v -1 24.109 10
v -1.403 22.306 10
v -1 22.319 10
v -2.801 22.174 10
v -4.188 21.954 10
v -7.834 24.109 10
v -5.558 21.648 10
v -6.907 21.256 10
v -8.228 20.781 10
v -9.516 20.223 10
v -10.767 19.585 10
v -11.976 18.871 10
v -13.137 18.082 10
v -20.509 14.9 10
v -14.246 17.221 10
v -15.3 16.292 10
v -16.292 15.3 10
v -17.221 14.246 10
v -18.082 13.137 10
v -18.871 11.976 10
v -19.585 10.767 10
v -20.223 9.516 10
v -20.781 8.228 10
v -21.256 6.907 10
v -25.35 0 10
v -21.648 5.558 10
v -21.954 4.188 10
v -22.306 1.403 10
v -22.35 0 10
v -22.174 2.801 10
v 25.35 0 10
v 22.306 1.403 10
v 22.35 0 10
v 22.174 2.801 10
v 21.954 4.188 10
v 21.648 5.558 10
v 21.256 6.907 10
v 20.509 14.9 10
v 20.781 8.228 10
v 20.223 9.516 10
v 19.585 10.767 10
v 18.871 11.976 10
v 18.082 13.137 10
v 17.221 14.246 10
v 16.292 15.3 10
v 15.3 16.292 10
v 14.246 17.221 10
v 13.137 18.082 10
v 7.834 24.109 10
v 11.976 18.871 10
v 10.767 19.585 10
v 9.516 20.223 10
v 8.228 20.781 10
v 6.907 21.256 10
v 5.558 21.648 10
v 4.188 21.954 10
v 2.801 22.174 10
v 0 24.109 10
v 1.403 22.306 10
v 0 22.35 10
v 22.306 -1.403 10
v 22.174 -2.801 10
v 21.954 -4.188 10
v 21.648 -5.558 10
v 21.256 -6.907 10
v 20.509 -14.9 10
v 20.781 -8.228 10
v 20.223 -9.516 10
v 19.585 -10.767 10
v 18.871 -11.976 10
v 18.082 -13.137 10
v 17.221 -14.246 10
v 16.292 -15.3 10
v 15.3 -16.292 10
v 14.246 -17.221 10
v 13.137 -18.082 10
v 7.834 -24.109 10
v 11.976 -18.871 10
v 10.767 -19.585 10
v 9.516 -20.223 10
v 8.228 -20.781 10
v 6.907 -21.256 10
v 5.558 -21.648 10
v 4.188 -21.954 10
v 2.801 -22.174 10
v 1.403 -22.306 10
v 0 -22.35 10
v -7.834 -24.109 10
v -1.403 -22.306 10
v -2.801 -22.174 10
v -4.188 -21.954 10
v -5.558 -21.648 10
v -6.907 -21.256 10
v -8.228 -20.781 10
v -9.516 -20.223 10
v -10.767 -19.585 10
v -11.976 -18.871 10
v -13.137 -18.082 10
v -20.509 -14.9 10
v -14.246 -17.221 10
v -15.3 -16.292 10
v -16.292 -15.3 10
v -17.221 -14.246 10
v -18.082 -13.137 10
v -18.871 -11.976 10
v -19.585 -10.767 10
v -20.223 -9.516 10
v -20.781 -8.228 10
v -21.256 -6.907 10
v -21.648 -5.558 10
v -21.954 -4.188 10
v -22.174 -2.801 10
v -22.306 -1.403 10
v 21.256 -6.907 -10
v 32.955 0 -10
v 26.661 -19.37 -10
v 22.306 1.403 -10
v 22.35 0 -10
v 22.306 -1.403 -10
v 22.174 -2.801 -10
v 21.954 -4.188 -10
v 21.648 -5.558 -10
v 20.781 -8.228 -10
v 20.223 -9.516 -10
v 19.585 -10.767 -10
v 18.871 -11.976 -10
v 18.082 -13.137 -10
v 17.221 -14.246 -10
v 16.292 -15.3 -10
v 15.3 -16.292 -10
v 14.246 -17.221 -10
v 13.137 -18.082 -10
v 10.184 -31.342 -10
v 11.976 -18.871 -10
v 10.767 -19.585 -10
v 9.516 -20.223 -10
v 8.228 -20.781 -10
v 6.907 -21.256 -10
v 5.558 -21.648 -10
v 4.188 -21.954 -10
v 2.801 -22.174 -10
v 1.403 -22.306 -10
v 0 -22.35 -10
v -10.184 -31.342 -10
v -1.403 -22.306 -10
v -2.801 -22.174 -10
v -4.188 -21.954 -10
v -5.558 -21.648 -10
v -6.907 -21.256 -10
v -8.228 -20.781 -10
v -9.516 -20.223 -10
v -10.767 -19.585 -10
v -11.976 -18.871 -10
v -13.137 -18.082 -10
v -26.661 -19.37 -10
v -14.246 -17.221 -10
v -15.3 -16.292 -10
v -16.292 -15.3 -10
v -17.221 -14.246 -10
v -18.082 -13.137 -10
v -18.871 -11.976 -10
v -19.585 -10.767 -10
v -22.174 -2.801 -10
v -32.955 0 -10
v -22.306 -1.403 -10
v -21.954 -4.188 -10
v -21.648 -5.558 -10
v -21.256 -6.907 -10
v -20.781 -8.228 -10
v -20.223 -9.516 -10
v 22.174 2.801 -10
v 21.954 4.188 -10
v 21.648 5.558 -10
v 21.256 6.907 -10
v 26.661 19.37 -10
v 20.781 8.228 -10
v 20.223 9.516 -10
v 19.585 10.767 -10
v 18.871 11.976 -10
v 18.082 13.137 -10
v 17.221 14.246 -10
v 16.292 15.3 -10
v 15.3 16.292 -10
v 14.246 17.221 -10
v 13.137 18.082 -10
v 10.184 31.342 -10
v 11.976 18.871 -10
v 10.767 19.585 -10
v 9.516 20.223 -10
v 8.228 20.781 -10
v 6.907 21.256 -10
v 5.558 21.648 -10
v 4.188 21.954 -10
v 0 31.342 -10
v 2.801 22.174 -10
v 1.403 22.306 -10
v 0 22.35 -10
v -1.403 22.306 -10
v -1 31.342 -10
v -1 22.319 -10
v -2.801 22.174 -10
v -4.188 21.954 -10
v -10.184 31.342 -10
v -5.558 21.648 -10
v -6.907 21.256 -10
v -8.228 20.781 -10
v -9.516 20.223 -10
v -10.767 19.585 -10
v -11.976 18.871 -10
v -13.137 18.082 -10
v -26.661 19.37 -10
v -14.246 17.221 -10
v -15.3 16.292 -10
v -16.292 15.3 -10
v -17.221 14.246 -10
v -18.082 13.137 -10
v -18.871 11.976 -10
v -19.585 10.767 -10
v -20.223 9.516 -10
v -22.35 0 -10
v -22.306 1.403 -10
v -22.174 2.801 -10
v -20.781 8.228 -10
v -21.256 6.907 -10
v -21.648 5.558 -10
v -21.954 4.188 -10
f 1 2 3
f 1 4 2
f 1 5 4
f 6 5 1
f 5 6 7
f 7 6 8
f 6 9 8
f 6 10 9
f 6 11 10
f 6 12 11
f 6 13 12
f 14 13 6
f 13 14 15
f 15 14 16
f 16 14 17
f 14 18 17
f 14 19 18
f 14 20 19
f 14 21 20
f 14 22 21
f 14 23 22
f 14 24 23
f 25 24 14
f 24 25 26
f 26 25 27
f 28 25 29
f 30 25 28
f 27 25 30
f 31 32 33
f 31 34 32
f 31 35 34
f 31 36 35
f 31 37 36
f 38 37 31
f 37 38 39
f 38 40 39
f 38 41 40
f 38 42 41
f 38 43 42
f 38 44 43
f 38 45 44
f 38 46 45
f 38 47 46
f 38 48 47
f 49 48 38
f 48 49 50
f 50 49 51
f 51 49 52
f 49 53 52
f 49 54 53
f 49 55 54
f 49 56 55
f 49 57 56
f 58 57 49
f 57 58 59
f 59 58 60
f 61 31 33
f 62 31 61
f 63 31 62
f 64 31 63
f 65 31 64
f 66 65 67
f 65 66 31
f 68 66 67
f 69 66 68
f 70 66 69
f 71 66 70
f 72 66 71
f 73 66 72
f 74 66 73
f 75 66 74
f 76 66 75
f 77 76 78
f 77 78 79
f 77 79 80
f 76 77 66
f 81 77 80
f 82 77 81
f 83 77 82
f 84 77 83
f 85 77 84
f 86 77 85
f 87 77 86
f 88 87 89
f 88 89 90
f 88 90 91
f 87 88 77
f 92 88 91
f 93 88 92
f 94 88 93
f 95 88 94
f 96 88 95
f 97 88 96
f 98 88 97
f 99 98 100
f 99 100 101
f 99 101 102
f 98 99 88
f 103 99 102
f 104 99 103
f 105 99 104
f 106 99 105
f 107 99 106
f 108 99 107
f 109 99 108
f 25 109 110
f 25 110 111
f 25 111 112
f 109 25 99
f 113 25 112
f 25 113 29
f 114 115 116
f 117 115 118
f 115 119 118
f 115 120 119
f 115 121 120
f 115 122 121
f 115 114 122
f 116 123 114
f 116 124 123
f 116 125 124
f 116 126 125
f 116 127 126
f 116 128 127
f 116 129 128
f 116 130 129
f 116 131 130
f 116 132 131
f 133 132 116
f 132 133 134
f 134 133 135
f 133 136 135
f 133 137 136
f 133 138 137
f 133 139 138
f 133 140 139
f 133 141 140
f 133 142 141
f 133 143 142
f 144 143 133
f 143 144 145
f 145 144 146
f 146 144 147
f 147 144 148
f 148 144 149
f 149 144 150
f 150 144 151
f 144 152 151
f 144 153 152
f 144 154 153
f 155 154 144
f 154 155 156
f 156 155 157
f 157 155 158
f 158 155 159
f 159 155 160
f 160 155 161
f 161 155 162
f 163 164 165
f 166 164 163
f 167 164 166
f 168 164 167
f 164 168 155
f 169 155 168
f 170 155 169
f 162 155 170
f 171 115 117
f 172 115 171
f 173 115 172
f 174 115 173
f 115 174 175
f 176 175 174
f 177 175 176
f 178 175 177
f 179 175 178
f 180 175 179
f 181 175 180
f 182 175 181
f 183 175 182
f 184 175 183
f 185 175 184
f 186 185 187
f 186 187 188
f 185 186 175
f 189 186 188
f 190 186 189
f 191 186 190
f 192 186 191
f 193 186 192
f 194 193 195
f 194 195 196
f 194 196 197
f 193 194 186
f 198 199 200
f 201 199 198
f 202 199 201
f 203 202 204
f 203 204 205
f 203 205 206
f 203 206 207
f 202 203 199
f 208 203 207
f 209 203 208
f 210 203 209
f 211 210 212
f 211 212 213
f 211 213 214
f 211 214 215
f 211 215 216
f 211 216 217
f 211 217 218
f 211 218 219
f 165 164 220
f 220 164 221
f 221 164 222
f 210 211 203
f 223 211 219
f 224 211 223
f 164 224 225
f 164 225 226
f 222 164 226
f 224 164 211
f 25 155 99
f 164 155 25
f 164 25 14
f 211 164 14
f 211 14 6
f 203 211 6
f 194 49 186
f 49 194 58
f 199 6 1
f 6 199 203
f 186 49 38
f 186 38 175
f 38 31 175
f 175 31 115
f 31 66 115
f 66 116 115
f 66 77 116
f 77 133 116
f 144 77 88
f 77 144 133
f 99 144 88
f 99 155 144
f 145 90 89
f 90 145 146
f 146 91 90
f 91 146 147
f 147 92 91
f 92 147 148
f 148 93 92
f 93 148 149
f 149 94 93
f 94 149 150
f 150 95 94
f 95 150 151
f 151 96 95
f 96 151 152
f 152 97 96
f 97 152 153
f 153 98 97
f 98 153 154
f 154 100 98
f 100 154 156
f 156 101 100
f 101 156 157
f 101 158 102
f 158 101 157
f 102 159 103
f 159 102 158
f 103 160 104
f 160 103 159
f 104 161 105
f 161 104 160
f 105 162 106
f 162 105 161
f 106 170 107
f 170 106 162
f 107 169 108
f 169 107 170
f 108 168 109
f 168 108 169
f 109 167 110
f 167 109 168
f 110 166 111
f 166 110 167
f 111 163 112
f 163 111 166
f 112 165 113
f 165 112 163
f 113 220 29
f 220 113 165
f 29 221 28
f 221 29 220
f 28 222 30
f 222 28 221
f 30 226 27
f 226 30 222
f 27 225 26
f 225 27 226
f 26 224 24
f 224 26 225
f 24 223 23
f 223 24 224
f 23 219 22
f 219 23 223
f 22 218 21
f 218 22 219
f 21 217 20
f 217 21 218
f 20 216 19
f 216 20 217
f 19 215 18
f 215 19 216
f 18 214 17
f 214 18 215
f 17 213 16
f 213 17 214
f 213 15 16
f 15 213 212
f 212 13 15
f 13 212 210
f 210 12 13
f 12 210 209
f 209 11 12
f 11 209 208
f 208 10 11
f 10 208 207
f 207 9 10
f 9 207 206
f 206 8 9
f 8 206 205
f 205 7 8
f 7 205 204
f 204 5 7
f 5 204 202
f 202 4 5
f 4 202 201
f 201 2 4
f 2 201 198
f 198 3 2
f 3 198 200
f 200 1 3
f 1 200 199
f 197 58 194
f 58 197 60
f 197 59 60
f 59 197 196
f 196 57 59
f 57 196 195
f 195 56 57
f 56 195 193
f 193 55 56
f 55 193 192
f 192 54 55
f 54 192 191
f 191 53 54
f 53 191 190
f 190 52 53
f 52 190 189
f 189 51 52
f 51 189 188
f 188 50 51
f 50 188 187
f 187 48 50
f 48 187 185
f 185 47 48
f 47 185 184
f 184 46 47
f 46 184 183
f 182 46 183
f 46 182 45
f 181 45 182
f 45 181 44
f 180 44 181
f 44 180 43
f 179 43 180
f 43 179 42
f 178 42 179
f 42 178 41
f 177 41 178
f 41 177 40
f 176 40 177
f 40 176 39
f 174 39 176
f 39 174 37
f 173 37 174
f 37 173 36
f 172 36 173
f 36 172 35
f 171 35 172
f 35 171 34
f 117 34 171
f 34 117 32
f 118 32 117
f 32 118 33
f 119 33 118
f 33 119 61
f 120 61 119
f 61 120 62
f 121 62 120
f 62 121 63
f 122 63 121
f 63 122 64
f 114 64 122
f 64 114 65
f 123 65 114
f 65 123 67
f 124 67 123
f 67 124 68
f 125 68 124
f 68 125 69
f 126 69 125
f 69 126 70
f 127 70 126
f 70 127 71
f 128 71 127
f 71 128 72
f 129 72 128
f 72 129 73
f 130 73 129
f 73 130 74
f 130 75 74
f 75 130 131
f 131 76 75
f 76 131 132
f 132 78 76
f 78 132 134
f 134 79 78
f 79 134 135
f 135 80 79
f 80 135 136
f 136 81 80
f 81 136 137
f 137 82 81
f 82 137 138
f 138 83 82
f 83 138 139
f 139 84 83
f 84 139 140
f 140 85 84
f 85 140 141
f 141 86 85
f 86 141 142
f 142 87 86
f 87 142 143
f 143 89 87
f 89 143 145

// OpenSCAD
// file: myTools.scad
module tube (r = 0, d = 0, l = 0, 
            thick = 0, 
            bCentered = true, 
            taper_pct = 0, 
            circlip = false) // r=radius d=dia l=length 
{
    assert( r != 0 || d != 0, "specify one of radius or diameter");
    assert( l != 0 , "tube: need length 'l' to be non zero");
    assert( thick != 0, "wall thickness cannot be zero");

    punch = $preview ? .2 : 0; // stop funny view artifact

    dia = r ? r * 2 : d;

    od = ((thick > 0) ? dia + thick * 2 : dia);
    id = (thick > 0) ? dia             : dia  + thick *2; 

    
    
    if (thick > 0)
        echo ("tube\tMIN id = ", id, "od = ", od, "wall = ", thick, "center= ", bCentered);
    else
        echo ("tube\tMAX od = ", od, "id = ", id, "wall = ", thick, "center= ", bCentered);

    echo ("tube\tHeigth = ", l);
        
    if (taper_pct != 0)
    {
        echo ("tube\t*** OD expanded by ", taper_pct, "%, : bottom od = ", od * (1. +taper_pct/100), "top od = ", od);
    }
    
    assert(dia || dia < 0, "tube : missing r or d ");
    
    // if taper_pct specified, the base will always be closest to 0,0,0
    translate([ 0, 0, taper_pct == 0 ? 0: bCentered ? l/2:l  ])
    rotate([0, taper_pct == 0 ? 0 : 180, 0 ])

    difference()
    {
        // make a reese's cup
        {
            color("YELLOW", .3)
            linear_extrude(height= l, scale = 1 + taper_pct/100)
                difference()
                {
                    circle(d = od);
                    circle(d = .5);
                }
        }
    
     // hollow out reessed cup
     color("GREEN")
     translate([0, 0, -punch/2])
     linear_extrude(height= l+ punch*2, $fn=100)
     {
        circle(d = id);
        if (circlip) #square([1 + punch, od ]);
     }
    
    }
}
//==============================================================================
        
module abox (dims, 
            thick = 0, 
            bCentered = true, 
            round_out = 0, 
            round_in = 0, 
            bSolid = false,
            bHollow = false,
            elevator = 0)   // move bottom up by X
{
    punch = $preview ? .1 : 0; // stop funny view artifact
    
    assert(thick != 0, "Thick must be specified. +=outside dim, -= inside dims");
    assert(dims.z > thick, "wall thickness too large for depth of box");

    wall2 = abs(thick) * 2; // 2 walls in each direction
    wall = wall2 / 2;
    
    // box either grows inward (thick < 0) or outward (thick > 0)  from dims
    fat = dims + [ wall2, wall2, wall];
    thin = dims - [ wall2, wall2, wall];
    
    offset = (thick > 0 && bCentered == false) ? wall : 0;
    
    //echo ("abox : adjusting x,y,z by ", offset, " to move origin from  center to 0,0,0");
    translate( [ bCentered ? 0 : dims.x /2 + offset, bCentered ? 0 : dims.y /2 + offset, bCentered ? 0 : dims.z /2 + offset/2]) 
    {
        if (thick > 0)
        {   
            // wall grows outwards from users dim
            echo ("making a box, MAX INSIDE dim = ", dims, "a wall=", thick, "mm ... max outside = ", fat, " mm");
        }
        else
        {
            // wall grows inward from users dime
            echo ("making a box, MAX OUTSIDE dim = ", dims, "a wall=", thick, "mm ... min inside = ", thin, " mm");
        }
        
        // linear extrude alway works in the positive x/y plane an goes upward.
        // after calc, re-center about 0,0,0 where a bCentered cube would be
        
        translate([ 0, 0, thick > 0  ? -fat.z/2 : -dims.z/2 ])
        difference()
        {
            echo ("round_out = ", round_out);

            // MAKE SOLID BOX --------------------------------------
            router_outside = round_out ? round_out : 0;
            x = thick > 0  ? fat.x - router_outside : dims.x - router_outside;
            y = thick > 0  ? fat.y - router_outside : dims.y - router_outside;


            // MAKE PUCHNED INSIDE
            // using 'offset' it will add r on all dimensions, then round., 
            // so now you have fatter perimeter than you started with :(
            //  but at least the corners are round.
            
            // Compensate by shrinking dimension by r, 
            // and then by calling offset, offset will then add it back

            color("YELLOW", .2)

            linear_extrude(thick > 0  ? fat.z : dims.z)
            if (round_out)
            {
                offset( r= round_out, $fn=30)
                square( [x - router_outside, y - router_outside], true);
            }
            else square( [x - router_outside, y - router_outside], true);
           
            // time to punch out the inside if requested.
            if (bSolid == false)
            {
                hollow_offset = bHollow ? fat.z/2 + .2  : dims.z/2 +.2;
                // punching out inside. its either dims or thin.
                router_inside = round_in;
                echo ("round_in = ", router_inside);
                xi = thick > 0  ? dims.x  : thin.x;
                yi = thick > 0  ? dims.y : thin.y ;

                color("GREEN")

                // move 'punch' up if you need a bottom else zero (hollowed out)

                translate([ 0,0, bHollow ? -.1 : wall + elevator]) 
                linear_extrude(thick > 0  ? fat.z - wall  + hollow_offset : dims.z - wall + hollow_offset)
                //#linear_extrude(fat.z - wall  + hollow_offset)
                
                if (round_in) 
                {
                    offset( r= round_in, $fn=30)
                    square( [ xi - router_inside, yi - router_inside], true);
                }
                else
                    square( [ xi, yi], true);
            }
        }
    }
 }


// 50x25x10 box walls grow inward (-2). on center origin midpoint
// rounded outside (default), sharp corner inside(default), bCentered about 0,0,0
//color("GREEN", .9)
//abox([50,25, 10], -2, true); 


// 50x25x10 box walls grow inward (-2). on center origin midpoint
// sharp outside corners, rounded inside corners. Sit on x,y plane
color("BLUE", .9)
abox([50,20, 10], +2, round_in=2, bCentered = false);  // 50x25x10 box inside dim origin has 0,0


// 50x25x10 box walls grow inward (-2). on center origin midpoint
// sharp corners inside and out. sits on x,y plane
color("GREY", .9)//
translate([ 55, 0, 0])      
abox([50,20, 10], +2, round_out=3, false);

color("PINK", .9)//
translate([ 115, 10, 10])      
abox([86.66, 56.865, 5], -5, bHollow = true, bCentered = false); 

color("GREEN", .9)//
translate([ 140, 10, -10])      
abox([86.66, 56.865, 5], 3, bHollow = true, bCentered = false); 

/*
// 50x25x10 box walls grow inward (-2). on center origin midpoint
// round corners outside and SOLID
color("BLUE", .9)//
translate([ 55, 0, 0])      
abox([50,25, 10], +2, round_out=2, round_in=0, false, bSolid = true); // 50x25x10 box outside dim origin is 0,0
*/

//translate ([-30,-30, 0])
{
/*
    // tube outer dia  20, inner dia = (20 - 8)
    color("PINK")
    tube (d = 20, l = 20, thick = -8, bCentered = false);

    // tube, inner dia = (2* 10), outer dia = ((2*10) + 2) 
    color("PURPLE", .3)
    tube (r = 10, l = 20, thick = +2, bCentered= true);
*/
/*
    tube (d = 60, l = 20, thick = -6, bCentered = false);

    translate([0, 0, 50])
    tube (d = 60, l = 20, thick = -6, bCentered = false, taper_pct = 20, circlip = true);
    //color("GREEN")
    //tube (d = 20, l = 20, thick = -2, bCentered = false, taper = 10, circlip = true);
*/

}
// main file
//use <otherPeoplesWork/threads-scad/threads.scad>
use <myTools.scad>

/* [Hidden] */
$fn=10;   //circle quantize 360/10=36 degrees per side
 tube  (d = 44.7,       // tight diameter of tube
        l = 20,         // length 20mm
        thick = +3,     // minimum wall thickness
        centered = false, // keep logic in postive z 
        taper_pct = 30, // fatten base by 30%
        circlip = true  // cut a thin line for expansion);
        );
        
